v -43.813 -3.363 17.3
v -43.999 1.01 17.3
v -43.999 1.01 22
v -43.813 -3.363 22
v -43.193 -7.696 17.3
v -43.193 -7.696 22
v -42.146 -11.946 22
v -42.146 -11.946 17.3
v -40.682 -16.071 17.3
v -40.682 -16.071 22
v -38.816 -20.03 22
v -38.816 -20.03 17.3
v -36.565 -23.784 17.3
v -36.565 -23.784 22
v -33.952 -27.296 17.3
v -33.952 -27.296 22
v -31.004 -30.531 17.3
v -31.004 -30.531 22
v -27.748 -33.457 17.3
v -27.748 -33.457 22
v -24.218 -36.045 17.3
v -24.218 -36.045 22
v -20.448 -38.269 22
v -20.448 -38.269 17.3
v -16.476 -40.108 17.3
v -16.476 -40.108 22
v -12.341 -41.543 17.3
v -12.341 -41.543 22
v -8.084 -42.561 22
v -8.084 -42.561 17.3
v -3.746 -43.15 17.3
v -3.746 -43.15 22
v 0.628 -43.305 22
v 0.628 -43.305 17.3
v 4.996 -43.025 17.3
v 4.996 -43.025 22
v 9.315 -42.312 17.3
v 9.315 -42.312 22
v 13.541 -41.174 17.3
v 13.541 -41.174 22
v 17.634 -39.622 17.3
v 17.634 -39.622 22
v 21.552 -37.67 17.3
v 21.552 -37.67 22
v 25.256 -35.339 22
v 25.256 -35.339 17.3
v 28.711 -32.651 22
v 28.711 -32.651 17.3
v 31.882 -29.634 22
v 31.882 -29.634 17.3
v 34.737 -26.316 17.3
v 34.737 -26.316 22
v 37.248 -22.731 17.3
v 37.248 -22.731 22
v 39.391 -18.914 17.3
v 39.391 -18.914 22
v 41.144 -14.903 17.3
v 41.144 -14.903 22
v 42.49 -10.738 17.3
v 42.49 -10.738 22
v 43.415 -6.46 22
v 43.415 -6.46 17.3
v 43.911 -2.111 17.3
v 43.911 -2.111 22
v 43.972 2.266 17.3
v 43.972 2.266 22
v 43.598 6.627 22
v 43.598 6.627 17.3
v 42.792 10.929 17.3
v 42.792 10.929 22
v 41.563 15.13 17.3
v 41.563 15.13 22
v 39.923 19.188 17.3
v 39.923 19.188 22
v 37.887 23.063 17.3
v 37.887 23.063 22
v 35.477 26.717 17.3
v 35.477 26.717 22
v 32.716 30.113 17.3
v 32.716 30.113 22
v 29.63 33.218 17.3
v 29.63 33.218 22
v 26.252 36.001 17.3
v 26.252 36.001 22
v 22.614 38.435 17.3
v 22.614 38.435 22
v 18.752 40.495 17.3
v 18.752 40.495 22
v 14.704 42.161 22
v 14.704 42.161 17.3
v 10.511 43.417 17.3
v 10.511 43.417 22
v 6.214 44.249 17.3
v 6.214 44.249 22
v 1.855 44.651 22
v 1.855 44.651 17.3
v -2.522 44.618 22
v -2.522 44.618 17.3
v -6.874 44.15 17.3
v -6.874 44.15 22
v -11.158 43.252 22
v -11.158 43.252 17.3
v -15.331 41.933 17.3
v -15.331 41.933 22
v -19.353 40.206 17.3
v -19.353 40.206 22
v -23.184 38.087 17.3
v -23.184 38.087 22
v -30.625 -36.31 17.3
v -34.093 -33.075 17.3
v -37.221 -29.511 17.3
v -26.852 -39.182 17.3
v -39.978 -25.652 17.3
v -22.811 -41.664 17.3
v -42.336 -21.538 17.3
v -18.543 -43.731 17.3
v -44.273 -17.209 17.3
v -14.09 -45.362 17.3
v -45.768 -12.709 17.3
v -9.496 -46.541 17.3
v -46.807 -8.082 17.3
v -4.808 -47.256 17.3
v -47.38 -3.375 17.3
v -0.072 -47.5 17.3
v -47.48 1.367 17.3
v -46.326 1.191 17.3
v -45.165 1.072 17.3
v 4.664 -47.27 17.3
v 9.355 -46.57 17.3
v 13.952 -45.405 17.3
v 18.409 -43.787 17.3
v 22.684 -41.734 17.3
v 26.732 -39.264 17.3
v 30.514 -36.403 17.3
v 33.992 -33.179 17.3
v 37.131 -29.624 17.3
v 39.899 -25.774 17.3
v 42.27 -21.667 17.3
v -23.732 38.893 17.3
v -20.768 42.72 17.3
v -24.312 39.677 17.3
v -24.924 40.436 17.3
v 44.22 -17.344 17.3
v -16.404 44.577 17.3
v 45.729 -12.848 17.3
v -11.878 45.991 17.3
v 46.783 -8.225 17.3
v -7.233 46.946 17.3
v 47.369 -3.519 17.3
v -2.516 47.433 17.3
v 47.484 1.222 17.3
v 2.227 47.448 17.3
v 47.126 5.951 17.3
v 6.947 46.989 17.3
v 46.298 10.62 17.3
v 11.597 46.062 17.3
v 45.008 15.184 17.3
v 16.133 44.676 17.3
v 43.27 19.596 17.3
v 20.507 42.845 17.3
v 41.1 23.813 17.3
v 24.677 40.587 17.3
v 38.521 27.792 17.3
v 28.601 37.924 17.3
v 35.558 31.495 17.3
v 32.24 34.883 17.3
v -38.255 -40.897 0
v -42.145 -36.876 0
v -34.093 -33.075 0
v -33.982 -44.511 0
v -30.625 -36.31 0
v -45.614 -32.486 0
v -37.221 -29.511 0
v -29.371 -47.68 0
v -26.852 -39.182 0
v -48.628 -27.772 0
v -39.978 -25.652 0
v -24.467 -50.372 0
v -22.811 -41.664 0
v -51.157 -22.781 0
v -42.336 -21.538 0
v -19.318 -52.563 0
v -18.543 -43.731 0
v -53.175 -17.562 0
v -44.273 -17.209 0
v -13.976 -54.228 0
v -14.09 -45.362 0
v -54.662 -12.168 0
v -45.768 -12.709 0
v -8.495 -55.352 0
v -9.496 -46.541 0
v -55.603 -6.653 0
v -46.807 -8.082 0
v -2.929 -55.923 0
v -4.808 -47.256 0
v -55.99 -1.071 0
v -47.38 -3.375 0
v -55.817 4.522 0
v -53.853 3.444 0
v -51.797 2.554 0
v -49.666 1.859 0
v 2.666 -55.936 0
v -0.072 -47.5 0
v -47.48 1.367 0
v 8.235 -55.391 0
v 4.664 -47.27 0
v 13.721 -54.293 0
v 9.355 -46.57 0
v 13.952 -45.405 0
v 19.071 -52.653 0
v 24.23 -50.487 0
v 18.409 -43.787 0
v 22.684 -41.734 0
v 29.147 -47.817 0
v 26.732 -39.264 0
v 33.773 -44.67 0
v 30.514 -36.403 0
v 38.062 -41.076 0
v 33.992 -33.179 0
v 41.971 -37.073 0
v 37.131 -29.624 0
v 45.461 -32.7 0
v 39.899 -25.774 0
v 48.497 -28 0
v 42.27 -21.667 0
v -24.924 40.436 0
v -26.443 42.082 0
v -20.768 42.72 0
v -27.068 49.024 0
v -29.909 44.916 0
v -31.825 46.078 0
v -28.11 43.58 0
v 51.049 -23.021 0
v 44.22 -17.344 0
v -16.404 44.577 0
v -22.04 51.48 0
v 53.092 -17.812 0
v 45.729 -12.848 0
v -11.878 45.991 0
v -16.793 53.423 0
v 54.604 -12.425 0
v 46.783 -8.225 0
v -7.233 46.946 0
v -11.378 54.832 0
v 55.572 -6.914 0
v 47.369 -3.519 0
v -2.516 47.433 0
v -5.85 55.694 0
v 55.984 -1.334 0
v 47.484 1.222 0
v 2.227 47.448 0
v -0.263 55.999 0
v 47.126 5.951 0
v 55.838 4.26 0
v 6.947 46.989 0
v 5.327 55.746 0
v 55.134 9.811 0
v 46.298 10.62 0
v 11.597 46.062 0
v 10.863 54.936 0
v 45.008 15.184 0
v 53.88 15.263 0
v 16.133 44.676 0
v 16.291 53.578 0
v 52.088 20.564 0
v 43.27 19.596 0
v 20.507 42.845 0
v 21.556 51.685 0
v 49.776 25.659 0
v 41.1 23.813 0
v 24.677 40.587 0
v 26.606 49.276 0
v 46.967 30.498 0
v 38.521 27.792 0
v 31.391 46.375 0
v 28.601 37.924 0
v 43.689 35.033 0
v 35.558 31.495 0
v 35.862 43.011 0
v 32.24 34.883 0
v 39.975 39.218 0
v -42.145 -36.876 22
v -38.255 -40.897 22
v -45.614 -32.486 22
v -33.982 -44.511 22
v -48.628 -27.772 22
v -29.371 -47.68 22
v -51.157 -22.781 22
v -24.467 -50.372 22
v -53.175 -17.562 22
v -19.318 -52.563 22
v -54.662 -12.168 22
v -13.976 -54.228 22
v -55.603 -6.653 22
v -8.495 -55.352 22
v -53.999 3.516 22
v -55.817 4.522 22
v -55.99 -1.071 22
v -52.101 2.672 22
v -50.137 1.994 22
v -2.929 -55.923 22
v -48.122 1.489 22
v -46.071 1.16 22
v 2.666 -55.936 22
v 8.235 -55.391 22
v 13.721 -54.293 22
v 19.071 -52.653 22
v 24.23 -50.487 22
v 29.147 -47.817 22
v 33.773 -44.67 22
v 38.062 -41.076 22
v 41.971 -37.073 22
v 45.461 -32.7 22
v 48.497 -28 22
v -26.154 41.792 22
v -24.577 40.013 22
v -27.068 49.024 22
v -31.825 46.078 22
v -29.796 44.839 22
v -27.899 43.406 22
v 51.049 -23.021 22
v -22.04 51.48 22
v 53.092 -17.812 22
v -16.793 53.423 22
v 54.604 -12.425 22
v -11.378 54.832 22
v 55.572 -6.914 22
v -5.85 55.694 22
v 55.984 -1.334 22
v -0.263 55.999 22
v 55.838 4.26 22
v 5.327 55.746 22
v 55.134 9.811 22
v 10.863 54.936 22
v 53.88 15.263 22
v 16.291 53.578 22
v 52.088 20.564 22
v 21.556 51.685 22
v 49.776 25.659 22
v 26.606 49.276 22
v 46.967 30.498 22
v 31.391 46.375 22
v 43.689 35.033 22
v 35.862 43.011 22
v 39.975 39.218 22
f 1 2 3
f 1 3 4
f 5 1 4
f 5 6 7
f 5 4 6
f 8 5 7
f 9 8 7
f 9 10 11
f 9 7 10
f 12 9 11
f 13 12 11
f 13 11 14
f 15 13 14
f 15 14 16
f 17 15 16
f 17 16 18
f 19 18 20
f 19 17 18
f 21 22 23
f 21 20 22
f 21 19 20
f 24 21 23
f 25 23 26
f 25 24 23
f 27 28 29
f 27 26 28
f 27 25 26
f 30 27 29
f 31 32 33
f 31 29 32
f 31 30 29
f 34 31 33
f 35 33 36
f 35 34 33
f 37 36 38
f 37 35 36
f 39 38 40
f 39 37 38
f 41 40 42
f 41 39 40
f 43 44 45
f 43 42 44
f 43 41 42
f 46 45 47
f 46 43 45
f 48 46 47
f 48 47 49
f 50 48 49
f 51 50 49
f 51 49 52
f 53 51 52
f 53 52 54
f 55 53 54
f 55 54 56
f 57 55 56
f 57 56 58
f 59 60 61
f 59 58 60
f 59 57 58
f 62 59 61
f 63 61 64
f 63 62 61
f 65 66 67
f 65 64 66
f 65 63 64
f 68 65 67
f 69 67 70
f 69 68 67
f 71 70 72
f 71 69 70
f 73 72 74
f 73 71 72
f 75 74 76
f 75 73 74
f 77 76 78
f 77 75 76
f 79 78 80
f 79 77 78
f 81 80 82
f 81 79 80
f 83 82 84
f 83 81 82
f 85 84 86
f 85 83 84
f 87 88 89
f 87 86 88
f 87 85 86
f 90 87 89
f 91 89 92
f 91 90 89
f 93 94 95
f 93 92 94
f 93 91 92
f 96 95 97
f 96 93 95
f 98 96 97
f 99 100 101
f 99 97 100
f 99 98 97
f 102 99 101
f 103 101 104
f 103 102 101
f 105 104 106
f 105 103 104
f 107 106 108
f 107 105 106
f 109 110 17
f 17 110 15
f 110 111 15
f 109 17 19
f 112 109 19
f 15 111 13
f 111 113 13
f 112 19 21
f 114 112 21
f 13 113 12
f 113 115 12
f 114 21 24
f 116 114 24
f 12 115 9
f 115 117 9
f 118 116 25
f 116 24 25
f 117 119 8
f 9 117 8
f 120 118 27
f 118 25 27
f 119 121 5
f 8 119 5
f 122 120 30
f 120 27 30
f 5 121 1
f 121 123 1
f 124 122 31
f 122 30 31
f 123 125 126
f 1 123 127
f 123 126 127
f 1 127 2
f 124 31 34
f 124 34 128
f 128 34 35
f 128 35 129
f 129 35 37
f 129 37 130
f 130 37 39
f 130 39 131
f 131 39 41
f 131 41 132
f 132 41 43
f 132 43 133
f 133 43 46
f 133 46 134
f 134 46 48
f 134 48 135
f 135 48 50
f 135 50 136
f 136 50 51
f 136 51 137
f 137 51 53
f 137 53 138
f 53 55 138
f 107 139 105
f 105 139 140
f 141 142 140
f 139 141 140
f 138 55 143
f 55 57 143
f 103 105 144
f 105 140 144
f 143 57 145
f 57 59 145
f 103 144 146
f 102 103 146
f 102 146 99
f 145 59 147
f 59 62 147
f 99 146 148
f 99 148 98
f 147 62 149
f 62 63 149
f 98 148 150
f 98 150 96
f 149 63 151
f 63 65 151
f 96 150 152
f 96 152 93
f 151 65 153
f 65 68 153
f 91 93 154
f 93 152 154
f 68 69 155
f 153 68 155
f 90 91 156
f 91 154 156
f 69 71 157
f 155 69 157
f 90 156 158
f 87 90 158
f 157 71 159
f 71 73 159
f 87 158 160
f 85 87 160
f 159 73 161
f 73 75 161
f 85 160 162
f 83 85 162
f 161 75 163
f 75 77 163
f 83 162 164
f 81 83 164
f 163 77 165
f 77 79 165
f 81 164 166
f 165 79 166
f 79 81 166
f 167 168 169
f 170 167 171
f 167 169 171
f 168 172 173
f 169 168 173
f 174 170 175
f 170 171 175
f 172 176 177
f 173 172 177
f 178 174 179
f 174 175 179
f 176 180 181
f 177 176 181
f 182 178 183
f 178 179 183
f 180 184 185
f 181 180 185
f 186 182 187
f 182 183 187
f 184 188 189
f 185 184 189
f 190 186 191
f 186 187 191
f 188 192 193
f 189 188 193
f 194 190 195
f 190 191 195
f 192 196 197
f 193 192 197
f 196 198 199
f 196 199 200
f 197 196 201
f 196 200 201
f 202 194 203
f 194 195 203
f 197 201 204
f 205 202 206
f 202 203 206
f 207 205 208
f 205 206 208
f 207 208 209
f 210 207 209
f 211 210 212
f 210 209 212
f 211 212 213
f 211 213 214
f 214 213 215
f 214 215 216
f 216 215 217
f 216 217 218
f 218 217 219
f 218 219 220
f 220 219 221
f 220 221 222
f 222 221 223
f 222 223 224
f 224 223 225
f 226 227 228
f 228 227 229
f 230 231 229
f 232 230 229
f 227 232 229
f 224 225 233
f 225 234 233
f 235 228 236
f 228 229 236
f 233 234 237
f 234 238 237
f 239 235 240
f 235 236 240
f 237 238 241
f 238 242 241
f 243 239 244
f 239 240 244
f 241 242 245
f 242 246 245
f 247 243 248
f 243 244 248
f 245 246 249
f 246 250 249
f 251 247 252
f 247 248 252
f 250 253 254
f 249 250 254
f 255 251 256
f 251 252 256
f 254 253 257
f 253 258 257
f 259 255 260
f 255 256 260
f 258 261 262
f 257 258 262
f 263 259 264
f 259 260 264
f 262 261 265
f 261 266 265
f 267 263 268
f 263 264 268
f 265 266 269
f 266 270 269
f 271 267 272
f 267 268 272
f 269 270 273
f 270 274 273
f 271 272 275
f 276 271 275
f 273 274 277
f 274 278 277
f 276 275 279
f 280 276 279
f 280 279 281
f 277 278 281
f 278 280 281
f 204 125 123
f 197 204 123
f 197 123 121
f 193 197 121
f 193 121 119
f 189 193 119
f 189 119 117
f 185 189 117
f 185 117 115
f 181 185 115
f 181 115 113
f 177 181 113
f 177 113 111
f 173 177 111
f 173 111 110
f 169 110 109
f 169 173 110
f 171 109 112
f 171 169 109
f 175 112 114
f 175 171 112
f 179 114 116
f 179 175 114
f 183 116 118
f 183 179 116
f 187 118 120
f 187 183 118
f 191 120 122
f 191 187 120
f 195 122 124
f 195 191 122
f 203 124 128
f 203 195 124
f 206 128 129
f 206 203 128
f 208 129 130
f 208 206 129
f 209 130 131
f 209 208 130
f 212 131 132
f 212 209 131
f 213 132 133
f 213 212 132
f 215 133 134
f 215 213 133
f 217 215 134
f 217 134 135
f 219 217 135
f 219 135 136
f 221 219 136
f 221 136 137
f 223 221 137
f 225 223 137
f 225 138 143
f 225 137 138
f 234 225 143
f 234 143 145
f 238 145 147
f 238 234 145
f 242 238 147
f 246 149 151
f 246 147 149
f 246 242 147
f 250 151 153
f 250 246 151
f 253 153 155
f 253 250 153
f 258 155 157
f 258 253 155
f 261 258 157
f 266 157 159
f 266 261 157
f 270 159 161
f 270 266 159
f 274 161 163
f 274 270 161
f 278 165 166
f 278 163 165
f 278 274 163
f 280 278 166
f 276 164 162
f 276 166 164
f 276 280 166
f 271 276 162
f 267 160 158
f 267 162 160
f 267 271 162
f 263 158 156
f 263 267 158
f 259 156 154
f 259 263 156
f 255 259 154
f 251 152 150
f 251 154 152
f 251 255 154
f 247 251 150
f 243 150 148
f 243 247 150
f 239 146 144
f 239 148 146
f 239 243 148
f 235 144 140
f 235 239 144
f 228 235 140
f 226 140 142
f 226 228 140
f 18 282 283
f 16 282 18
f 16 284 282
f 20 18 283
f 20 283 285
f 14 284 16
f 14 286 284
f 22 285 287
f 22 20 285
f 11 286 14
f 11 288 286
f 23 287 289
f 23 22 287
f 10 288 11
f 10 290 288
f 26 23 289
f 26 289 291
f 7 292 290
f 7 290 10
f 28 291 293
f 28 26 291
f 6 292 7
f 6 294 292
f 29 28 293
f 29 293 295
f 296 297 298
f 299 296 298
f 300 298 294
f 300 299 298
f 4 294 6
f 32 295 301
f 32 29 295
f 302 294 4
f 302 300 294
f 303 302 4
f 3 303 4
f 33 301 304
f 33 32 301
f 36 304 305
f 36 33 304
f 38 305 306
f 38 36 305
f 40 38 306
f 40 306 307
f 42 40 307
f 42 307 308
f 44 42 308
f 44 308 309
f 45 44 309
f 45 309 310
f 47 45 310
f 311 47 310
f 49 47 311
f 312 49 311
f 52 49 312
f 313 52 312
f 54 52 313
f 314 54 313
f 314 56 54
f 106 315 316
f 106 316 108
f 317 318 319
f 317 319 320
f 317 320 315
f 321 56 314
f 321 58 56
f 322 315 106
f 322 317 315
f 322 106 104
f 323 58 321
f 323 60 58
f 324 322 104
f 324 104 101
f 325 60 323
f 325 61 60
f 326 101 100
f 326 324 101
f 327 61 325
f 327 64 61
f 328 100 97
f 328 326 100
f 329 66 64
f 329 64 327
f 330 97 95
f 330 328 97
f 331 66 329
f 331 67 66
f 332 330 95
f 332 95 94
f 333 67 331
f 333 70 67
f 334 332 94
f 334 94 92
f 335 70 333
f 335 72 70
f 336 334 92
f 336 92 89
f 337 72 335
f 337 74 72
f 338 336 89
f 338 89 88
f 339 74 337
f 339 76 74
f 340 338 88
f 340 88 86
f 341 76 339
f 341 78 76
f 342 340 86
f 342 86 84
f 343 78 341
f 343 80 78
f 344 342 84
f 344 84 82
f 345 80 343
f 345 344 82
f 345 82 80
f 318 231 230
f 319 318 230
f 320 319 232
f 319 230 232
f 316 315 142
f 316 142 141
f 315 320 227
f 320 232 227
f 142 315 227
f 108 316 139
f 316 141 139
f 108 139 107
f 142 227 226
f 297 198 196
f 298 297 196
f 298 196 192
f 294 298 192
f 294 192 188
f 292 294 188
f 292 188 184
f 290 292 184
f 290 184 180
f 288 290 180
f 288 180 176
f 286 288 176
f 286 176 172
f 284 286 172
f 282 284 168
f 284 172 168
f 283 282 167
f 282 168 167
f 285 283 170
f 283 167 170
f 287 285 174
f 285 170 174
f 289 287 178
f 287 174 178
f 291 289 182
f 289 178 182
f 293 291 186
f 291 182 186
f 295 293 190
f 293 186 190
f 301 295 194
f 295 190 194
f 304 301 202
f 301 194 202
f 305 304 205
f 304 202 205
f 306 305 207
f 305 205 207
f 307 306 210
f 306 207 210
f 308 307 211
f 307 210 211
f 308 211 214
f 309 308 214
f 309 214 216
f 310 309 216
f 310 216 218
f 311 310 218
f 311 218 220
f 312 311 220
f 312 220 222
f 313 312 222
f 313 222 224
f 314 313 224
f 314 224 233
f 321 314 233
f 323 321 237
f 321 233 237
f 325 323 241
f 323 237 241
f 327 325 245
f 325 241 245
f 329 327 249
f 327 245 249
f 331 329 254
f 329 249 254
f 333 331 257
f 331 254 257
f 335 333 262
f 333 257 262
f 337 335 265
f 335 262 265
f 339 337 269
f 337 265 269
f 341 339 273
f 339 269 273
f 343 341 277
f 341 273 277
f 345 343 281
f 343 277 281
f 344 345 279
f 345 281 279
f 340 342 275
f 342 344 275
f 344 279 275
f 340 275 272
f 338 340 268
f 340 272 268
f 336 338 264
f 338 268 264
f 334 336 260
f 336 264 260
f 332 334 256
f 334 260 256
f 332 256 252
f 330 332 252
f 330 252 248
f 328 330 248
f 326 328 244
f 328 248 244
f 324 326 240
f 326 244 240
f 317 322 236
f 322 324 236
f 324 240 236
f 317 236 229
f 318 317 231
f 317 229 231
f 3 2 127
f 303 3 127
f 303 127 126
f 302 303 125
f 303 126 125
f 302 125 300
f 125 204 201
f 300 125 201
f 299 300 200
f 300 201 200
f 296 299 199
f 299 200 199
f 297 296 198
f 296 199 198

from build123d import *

# Parameters (mm, degrees)
SKETCH_1_R           = 56
SKETCH_1_R_2         = 47.5
EXTRUDE_1_DEPTH      = 20
EXTRUDE_3_DEPTH      = 2
EXTRUDE_3_DEPTH_BACK = 2.7
SKETCH_3_R           = 56
SKETCH_3_R_2         = 44
SKETCH_4_R           = 24
CUT_EXTRUDE_1_DEPTH  = 83.194890352


with BuildPart() as part:
    # 草图1 → 凸台-拉伸1 (new body)
    with BuildSketch(Plane.XY):
        Circle(SKETCH_1_R)
        Circle(SKETCH_1_R_2, mode=Mode.SUBTRACT)
    extrude(amount=EXTRUDE_1_DEPTH)

    # 草图3 → 凸台-拉伸3 (add, two sides: drawn at the far end of the back side and taken through both)
    with BuildSketch(Plane.XY.offset(20).offset(-EXTRUDE_3_DEPTH_BACK)):
        Circle(SKETCH_3_R)
        with Locations((0, 0.69041818)):
            Circle(SKETCH_3_R_2, mode=Mode.SUBTRACT)
    extrude(amount=EXTRUDE_3_DEPTH + EXTRUDE_3_DEPTH_BACK)

    # 草图4 → 切除-拉伸1 (cut, through all)
    with BuildSketch(Plane(origin=(0, 0, 0), x_dir=(-1, 0, 0), z_dir=(0, 0, -1))):
        with Locations((43.301270189, 25)):
            Circle(SKETCH_4_R)
    extrude(amount=-CUT_EXTRUDE_1_DEPTH, mode=Mode.SUBTRACT)


solid = part.part
